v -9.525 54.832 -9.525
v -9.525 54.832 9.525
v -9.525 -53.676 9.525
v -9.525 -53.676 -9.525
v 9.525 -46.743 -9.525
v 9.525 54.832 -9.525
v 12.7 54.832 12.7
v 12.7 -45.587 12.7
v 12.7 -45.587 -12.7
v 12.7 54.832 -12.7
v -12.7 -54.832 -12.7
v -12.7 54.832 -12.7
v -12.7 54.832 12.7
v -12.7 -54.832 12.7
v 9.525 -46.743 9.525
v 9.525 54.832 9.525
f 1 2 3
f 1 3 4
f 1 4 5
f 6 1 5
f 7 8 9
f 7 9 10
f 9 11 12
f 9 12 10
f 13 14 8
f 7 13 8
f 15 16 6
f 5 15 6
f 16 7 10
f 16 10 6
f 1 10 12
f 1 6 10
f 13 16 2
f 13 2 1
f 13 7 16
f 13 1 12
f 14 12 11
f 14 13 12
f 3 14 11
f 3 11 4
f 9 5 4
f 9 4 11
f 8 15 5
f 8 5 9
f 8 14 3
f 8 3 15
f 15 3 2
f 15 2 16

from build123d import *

# Parameters (mm, degrees)
BOSS_EXTRUDE1_DEPTH = 12.7
SKETCH2_W           = 19.05
SKETCH2_H           = 19.05
CUT_EXTRUDE1_DEPTH  = 112.125209326


with BuildPart() as part:
    # Sketch1 → Boss-Extrude1 (new, symmetric)
    with BuildSketch(Plane.XY):
        Polygon((-12.7, -54.832089482), (12.7, -45.587245531), (12.7, 54.832089482), (-12.7, 54.832089482), align=None)
    extrude(amount=BOSS_EXTRUDE1_DEPTH, both=True)

    # Sketch2 → Cut-Extrude1 (cut, through all)
    with BuildSketch(Plane(origin=(0, 54.832089482, 0), x_dir=(1, 0, 0), z_dir=(0, 1, 0))):
        Rectangle(SKETCH2_W, SKETCH2_H)
    extrude(amount=-CUT_EXTRUDE1_DEPTH, mode=Mode.SUBTRACT)


solid = part.part
